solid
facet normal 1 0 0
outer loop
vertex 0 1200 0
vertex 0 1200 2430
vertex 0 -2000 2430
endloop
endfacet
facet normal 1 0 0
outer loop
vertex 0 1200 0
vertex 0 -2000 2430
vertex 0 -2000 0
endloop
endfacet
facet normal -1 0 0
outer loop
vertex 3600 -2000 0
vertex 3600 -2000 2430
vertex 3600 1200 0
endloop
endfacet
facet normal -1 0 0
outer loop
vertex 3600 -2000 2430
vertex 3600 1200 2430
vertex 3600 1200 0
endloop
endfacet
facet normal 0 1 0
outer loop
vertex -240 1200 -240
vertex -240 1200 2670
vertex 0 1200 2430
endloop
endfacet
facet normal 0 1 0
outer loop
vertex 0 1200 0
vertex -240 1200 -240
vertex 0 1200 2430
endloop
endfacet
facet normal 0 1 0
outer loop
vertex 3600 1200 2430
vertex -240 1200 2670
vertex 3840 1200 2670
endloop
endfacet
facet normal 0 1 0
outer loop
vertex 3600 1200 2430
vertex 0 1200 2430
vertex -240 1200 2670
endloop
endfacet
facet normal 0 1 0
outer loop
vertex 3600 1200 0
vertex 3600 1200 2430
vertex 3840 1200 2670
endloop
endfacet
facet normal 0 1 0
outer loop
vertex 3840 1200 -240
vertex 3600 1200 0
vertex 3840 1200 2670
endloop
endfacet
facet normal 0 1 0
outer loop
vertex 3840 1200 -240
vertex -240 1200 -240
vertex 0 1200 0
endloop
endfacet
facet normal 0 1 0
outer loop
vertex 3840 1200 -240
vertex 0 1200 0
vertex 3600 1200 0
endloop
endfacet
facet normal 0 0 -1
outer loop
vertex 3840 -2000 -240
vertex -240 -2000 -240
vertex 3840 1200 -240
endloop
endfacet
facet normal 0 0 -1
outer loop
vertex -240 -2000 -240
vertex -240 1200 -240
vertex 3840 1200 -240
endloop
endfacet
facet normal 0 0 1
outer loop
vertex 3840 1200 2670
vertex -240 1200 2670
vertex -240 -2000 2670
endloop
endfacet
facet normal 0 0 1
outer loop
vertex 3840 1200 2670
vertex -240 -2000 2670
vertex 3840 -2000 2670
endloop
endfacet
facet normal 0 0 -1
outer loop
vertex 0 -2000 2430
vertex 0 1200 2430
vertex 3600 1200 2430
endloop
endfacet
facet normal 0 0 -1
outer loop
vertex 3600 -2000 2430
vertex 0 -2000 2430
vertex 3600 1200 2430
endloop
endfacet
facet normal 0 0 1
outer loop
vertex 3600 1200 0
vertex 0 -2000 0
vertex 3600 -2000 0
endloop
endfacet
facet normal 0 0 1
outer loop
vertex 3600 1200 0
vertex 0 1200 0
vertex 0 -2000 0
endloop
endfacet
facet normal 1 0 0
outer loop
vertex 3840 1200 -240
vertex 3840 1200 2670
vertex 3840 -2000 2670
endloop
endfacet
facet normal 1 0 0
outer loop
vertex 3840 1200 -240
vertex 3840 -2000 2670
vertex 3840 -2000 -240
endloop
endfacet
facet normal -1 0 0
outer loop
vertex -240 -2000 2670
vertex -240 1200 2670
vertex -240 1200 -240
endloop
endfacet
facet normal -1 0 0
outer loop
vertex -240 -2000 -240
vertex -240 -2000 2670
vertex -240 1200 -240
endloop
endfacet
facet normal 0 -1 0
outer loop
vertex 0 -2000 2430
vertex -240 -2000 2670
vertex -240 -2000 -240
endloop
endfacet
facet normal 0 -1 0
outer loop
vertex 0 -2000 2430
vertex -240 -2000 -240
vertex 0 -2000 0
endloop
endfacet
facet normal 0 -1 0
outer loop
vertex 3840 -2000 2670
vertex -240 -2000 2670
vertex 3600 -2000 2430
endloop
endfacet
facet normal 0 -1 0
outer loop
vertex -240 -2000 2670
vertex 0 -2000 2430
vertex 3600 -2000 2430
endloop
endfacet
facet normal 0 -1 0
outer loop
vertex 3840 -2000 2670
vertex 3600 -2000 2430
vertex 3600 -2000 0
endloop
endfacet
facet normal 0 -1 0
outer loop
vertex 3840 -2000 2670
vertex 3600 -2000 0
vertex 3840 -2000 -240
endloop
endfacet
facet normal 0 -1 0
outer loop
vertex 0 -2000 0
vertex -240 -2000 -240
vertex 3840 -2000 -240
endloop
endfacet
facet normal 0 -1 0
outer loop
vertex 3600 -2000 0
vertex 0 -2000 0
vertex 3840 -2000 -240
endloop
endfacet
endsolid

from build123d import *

# Parameters (mm, degrees)
SKETCH_1_W           = 4080
SKETCH_1_H           = 2910
SKETCH_1_W_2         = 3600
SKETCH_1_H_2         = 2430
EXTRUDE_1_DEPTH      = 1200
EXTRUDE_1_DEPTH_BACK = 2000


with BuildPart() as part:
    # 草图1 → 拉伸-薄壁1 (new body, two sides)
    with BuildSketch(Plane(origin=(0, 0, 0), x_dir=(1, 0, 0), z_dir=(0, 1, 0))) as extrude_1_sk:
        with Locations((1800, -1215)):
            Rectangle(SKETCH_1_W, SKETCH_1_H)
        with Locations((1800, -1215)):
            Rectangle(SKETCH_1_W_2, SKETCH_1_H_2, mode=Mode.SUBTRACT)
    extrude(amount=EXTRUDE_1_DEPTH)
    extrude(extrude_1_sk.sketch, amount=-EXTRUDE_1_DEPTH_BACK)


solid = part.part
